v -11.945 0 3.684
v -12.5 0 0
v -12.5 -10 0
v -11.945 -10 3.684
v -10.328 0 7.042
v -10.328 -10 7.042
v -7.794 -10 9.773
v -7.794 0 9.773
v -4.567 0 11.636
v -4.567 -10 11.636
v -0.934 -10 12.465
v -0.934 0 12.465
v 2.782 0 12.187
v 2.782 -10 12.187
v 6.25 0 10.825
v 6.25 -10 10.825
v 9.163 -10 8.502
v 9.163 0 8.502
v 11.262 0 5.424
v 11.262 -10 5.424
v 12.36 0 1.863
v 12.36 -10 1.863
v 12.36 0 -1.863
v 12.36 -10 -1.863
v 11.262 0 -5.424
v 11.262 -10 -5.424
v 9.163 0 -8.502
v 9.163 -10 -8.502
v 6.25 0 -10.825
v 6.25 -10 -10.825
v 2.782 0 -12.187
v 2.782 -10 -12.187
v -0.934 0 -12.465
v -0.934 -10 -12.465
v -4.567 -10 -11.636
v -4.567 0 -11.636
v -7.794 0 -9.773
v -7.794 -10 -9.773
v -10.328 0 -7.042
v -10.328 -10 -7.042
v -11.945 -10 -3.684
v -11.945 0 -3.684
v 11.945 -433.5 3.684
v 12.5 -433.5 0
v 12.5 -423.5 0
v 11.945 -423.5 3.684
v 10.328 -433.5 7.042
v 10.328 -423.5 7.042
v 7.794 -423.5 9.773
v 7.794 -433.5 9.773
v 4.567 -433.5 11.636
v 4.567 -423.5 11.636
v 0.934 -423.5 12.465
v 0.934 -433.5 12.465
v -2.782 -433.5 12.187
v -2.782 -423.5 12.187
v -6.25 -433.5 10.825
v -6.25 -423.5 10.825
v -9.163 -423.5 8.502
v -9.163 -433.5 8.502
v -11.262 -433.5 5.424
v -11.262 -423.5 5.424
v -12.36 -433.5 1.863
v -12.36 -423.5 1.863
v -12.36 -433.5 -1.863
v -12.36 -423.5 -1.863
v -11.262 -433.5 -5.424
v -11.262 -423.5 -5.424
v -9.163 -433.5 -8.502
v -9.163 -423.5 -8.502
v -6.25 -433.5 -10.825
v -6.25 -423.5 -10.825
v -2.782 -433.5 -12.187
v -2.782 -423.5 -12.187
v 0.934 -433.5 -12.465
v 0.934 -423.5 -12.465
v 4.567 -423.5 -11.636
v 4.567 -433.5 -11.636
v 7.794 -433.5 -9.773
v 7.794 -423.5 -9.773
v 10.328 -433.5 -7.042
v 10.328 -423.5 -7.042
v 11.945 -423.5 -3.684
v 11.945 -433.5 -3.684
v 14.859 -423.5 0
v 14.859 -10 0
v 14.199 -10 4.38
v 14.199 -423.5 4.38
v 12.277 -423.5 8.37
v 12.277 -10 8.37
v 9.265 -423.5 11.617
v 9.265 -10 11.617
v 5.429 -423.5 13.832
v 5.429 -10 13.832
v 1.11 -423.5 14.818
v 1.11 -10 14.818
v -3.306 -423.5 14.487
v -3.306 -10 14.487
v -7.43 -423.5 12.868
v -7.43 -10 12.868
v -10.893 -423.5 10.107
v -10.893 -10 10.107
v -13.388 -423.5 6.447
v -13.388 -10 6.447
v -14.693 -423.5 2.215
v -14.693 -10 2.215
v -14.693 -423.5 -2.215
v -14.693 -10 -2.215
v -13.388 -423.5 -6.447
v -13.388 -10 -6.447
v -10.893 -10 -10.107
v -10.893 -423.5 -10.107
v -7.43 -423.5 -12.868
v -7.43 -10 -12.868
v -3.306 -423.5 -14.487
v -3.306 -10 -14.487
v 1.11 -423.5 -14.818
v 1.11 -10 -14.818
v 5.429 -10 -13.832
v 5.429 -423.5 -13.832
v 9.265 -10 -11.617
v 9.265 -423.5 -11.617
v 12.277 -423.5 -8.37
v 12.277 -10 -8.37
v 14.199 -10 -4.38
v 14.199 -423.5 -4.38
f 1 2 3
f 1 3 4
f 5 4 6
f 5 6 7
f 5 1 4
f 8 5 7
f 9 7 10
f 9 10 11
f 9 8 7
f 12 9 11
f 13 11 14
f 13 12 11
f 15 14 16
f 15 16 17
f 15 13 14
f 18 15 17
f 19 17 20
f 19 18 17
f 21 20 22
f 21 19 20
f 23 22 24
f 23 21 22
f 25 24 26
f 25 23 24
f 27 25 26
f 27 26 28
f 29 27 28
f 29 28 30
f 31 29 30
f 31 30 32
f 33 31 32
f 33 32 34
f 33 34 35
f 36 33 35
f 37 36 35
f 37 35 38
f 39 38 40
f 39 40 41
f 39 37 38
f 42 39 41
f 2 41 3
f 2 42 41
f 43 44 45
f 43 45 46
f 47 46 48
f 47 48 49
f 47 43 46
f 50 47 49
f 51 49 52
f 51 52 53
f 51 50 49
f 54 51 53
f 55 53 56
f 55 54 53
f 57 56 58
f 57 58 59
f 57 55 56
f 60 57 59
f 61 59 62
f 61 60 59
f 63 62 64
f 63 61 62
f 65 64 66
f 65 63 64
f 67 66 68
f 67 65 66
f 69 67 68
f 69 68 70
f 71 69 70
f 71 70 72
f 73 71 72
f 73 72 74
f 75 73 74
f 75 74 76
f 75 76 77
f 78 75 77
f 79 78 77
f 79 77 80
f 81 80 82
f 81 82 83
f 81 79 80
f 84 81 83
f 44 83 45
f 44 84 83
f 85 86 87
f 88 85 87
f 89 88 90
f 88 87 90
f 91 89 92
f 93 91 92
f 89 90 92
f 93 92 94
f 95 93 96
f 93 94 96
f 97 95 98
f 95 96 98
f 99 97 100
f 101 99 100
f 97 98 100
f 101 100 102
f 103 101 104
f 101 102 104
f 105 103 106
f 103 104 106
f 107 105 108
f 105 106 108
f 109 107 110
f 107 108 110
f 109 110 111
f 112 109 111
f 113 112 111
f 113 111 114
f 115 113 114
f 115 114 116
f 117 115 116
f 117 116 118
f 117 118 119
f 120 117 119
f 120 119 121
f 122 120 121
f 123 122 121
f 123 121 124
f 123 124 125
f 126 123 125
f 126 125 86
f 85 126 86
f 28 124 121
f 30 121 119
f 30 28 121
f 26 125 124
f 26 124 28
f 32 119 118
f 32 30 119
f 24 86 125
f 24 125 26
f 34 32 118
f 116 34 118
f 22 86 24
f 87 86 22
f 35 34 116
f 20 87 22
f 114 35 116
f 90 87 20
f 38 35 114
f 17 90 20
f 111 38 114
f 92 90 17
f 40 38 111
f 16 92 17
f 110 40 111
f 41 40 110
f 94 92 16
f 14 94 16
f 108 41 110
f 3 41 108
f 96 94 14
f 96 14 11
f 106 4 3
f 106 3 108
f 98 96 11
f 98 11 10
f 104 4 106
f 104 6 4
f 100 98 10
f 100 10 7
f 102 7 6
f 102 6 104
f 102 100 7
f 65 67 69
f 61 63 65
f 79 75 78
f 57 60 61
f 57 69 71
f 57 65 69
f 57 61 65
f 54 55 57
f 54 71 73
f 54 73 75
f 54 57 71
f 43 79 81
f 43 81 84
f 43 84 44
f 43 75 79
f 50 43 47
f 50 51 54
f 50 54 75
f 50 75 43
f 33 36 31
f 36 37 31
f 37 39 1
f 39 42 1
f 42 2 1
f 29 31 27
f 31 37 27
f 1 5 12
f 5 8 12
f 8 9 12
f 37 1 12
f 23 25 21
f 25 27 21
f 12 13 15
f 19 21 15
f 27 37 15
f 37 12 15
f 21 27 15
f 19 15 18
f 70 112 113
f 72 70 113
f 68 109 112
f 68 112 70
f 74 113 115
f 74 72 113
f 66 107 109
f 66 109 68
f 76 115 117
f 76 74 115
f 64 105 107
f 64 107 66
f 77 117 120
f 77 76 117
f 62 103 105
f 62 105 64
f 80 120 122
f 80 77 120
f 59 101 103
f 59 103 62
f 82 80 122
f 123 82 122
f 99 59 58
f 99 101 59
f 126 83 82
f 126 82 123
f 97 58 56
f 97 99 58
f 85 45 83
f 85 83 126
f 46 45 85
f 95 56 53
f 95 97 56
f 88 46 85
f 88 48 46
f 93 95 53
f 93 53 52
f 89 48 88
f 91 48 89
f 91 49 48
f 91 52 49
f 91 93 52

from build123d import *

# Parameters (mm, degrees)
F0_R     = 14.859199
F1_DEPTH = 433.5
F2_R     = 14.859199
F2_R_2   = 12.5
F3_DEPTH = 10
F4_R     = 14.859199
F4_R_2   = 12.5
F5_DEPTH = 10


with BuildPart() as f1:
    # F0 (on Front) → F1 (new body)
    with BuildSketch(Plane.XZ):
        Circle(F0_R)
    extrude(amount=F1_DEPTH)

    # F2 (on face) → F3 (cut)
    with BuildSketch(Plane(origin=(0, 0, 0), x_dir=(-1, 0, 0), z_dir=(0, 1, 0))):
        Circle(F2_R)
        Circle(F2_R_2, mode=Mode.SUBTRACT)
    extrude(amount=-F3_DEPTH, mode=Mode.SUBTRACT)

    # F4 (on face) → F5 (cut)
    with BuildSketch(Plane.XZ.offset(433.5)):
        Circle(F4_R)
        Circle(F4_R_2, mode=Mode.SUBTRACT)
    extrude(amount=-F5_DEPTH, mode=Mode.SUBTRACT)


solid = f1.part
